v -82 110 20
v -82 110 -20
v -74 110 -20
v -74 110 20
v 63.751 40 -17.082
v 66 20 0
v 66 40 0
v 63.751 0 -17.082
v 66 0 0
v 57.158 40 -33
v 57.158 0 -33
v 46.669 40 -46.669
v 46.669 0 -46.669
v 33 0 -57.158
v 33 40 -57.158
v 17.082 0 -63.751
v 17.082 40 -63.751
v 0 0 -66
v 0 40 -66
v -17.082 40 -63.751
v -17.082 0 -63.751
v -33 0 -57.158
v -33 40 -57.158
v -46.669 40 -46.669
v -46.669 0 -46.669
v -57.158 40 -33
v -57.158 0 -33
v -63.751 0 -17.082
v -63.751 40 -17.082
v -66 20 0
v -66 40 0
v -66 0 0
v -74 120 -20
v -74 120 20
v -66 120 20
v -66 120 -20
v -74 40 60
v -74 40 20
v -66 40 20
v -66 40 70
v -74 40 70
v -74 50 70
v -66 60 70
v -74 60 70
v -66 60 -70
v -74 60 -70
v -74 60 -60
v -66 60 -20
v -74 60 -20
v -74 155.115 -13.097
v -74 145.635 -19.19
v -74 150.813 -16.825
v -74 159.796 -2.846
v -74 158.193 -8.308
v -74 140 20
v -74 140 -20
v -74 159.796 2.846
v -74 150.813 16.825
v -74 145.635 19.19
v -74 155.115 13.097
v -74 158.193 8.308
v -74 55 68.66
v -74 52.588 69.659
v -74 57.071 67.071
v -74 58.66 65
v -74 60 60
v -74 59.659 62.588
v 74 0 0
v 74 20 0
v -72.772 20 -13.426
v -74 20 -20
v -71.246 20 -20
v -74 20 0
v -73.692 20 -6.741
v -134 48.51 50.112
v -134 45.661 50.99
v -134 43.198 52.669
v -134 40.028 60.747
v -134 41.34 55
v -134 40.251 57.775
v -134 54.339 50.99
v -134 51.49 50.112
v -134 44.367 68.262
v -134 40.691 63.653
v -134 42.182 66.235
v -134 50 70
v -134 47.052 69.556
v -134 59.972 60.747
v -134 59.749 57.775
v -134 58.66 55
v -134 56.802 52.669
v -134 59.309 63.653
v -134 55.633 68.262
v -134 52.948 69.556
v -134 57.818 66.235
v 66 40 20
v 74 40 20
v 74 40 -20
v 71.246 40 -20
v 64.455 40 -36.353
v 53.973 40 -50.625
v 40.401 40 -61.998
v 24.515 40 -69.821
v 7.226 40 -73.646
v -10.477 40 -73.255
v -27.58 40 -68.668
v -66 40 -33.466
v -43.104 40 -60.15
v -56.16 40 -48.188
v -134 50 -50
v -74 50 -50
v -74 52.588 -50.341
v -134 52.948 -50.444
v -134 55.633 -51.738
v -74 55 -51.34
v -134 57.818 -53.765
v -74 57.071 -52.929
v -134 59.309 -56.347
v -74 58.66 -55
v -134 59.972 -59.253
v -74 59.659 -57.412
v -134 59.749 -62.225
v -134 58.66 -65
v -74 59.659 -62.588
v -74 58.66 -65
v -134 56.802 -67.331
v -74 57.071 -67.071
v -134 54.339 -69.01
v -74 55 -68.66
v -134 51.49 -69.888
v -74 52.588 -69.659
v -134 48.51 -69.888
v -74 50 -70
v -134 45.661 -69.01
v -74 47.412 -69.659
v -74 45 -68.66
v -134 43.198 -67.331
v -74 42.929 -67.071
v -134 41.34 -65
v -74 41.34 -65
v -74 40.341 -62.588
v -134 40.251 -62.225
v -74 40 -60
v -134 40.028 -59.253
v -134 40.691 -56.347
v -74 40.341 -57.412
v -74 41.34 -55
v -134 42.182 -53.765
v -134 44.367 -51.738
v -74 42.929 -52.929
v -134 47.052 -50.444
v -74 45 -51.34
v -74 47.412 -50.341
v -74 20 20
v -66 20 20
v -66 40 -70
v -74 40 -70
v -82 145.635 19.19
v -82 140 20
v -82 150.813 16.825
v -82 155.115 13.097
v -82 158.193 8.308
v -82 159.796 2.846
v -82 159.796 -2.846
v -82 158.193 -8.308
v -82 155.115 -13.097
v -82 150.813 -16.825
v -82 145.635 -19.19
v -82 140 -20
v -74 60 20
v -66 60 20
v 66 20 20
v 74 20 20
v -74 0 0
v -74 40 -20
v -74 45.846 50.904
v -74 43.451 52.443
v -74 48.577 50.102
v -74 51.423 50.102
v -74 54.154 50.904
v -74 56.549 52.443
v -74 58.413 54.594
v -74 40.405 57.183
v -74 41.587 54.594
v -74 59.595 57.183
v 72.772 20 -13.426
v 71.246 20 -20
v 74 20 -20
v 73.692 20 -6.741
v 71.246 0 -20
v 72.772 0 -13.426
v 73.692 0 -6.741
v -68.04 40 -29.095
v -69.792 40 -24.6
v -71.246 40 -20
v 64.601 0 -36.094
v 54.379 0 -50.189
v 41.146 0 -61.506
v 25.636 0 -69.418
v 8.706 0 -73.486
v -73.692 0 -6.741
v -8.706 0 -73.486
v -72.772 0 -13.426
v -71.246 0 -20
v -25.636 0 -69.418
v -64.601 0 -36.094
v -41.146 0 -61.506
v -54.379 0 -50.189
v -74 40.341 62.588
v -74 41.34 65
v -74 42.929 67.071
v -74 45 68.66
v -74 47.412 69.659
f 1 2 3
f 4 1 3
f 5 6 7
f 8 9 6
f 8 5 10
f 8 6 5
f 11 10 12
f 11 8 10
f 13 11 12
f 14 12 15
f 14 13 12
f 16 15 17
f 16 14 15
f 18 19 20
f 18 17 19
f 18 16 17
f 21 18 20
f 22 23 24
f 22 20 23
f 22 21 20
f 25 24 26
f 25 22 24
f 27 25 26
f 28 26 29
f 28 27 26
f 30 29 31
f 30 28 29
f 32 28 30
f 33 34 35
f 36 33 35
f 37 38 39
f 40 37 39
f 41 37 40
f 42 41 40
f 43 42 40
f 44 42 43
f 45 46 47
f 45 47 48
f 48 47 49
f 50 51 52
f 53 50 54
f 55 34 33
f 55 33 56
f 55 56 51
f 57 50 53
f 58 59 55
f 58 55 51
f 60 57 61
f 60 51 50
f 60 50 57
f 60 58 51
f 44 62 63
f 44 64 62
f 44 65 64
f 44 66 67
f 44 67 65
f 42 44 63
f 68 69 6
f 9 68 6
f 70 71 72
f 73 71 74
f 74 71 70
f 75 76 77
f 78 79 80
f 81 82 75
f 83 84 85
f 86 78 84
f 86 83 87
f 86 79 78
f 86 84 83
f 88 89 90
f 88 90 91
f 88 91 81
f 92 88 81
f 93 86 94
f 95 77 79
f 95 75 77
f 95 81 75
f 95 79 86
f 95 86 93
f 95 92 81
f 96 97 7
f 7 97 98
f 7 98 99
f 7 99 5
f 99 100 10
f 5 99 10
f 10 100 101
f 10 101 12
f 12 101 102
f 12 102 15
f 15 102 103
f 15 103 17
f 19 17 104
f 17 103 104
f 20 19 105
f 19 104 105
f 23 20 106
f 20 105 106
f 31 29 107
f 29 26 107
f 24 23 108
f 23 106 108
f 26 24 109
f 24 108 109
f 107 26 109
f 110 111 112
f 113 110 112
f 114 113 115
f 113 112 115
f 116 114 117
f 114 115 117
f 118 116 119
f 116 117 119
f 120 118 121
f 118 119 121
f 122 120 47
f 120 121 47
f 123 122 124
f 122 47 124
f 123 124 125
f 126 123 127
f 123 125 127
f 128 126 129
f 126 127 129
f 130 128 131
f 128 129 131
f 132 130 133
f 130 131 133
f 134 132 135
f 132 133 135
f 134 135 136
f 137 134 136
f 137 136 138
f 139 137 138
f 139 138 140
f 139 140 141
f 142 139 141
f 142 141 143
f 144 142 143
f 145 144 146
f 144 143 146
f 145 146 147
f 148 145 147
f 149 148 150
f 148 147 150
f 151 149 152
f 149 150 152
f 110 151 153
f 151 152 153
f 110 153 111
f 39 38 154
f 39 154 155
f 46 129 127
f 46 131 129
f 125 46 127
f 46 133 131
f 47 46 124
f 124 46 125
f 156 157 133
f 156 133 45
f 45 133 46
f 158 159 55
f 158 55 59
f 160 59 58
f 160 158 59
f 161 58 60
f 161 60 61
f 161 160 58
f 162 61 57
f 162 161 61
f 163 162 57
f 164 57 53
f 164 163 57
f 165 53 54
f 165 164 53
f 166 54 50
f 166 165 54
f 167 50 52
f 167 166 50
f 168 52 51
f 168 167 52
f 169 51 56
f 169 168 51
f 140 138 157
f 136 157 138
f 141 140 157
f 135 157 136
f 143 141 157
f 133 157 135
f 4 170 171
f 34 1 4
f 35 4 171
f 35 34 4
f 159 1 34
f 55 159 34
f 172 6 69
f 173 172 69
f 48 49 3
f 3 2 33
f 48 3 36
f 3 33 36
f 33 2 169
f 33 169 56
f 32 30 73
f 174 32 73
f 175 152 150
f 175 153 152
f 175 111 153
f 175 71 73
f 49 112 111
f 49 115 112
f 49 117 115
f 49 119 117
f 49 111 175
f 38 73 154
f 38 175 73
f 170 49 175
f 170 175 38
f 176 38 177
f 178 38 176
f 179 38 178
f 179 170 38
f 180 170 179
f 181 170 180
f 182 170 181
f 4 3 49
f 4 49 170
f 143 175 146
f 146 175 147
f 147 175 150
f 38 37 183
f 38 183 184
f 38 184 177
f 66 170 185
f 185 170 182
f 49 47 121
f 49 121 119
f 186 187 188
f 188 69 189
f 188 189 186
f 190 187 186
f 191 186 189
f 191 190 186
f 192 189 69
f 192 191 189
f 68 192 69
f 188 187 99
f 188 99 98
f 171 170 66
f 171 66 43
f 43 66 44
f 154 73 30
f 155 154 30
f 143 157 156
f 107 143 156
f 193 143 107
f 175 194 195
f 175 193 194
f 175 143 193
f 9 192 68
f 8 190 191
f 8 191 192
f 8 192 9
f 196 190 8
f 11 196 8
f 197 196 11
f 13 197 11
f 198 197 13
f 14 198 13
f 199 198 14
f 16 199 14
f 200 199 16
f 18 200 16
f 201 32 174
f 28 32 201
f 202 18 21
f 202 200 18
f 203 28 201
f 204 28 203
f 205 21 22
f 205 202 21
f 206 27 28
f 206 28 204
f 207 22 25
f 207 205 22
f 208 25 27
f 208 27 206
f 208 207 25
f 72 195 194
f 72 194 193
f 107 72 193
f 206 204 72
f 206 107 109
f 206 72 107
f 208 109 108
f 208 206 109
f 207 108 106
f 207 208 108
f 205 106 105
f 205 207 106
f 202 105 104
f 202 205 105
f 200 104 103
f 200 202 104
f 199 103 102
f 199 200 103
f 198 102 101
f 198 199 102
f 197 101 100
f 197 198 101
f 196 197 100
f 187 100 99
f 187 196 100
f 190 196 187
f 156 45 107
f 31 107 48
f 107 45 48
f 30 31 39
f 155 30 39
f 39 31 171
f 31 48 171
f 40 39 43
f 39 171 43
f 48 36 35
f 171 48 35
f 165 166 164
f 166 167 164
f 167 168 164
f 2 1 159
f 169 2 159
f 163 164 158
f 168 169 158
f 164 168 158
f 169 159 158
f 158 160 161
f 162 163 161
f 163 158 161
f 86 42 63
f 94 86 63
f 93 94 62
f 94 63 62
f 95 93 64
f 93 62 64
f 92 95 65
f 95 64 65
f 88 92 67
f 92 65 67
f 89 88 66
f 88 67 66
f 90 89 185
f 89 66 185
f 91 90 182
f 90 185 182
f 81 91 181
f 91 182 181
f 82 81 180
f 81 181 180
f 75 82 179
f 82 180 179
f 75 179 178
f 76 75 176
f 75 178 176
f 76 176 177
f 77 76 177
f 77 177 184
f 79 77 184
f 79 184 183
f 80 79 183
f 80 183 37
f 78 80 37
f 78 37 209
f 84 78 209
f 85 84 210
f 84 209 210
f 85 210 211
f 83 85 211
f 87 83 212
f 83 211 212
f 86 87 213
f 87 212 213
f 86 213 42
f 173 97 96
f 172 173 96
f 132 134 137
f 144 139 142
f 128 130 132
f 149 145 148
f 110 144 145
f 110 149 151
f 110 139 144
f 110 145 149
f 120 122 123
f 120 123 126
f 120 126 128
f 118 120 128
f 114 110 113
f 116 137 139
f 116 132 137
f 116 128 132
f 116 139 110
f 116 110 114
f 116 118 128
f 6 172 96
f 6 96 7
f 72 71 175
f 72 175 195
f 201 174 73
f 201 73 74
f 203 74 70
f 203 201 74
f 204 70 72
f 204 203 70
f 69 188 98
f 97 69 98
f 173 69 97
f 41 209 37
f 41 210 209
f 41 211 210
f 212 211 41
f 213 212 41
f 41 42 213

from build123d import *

# Parameters (mm, degrees)
EXTRUDE_1_DEPTH     = 40
SKETCH_2_W          = 8
SKETCH_2_H          = 40
EXTRUDE_2_DEPTH     = 80
SKETCH_5_W          = 87.00766185
SKETCH_5_H          = 115.01495327
CUT_EXTRUDE_2_DEPTH = 10
SKETCH_6_R          = 85.063361003
CUT_EXTRUDE_3_DEPTH = 20
SKETCH_7_W          = 140
SKETCH_7_H          = 20
EXTRUDE_3_DEPTH     = 8
SKETCH_9_R          = 10
EXTRUDE_4_DEPTH     = 60
SKETCH_10_W         = 8
SKETCH_10_H         = 50
EXTRUDE_5_DEPTH     = 40
CUT_EXTRUDE_4_DEPTH = 40


with BuildPart() as part:
    # 草图1 → 凸台-拉伸1 (new body)
    with BuildSketch(Plane(origin=(0, 0, 0), x_dir=(1, 0, 0), z_dir=(0, 1, 0))):
        with BuildLine():
            Line((-74, 20), (-71.246052522, 20))
            ThreePointArc((-71.246052522, 20), (0, 74), (71.246052522, 20))
            Line((71.246052522, 20), (74, 20))
            Line((74, 20), (74, -20))
            Line((74, -20), (66, -20))
            Line((66, -20), (66, 0))
            ThreePointArc((66, 0), (0, 66), (-66, 0))
            Line((-66, 0), (-66, -20))
            Line((-66, -20), (-74, -20))
            Line((-74, -20), (-74, 20))
        make_face()
    extrude(amount=EXTRUDE_1_DEPTH)

    # 草图2 → 凸台-拉伸2 (add)
    with BuildSketch(Plane(origin=(0, 40, 0), x_dir=(1, 0, 0), z_dir=(0, 1, 0))):
        with Locations((-70, 0)):
            Rectangle(SKETCH_2_W, SKETCH_2_H)
        with Locations((70, 0)):
            Rectangle(SKETCH_2_W, SKETCH_2_H)
    extrude(amount=EXTRUDE_2_DEPTH)

    # 草图5 → 切除-拉伸2 (cut)
    with BuildSketch(Plane(origin=(74, 0, 0), x_dir=(0, 0, -1), z_dir=(1, 0, 0))):
        with Locations((-23.503830925, 97.507476635)):
            Rectangle(SKETCH_5_W, SKETCH_5_H)
    extrude(amount=-CUT_EXTRUDE_2_DEPTH, mode=Mode.SUBTRACT)

    # 草图6 → 切除-拉伸3 (cut)
    with BuildSketch(Plane.XZ):
        Circle(SKETCH_6_R)
        with BuildLine():
            Line((-71.246052522, 20), (-66, 20))
            Line((-66, 20), (-66, 0))
            Line((-66, 0), (-74, 0))
            ThreePointArc((-74, 0), (0, -74), (74, 0))
            Line((74, 0), (66, 0))
            Line((66, 0), (66, 20))
            Line((66, 20), (71.246052522, 20))
            ThreePointArc((71.246052522, 20), (0, 74), (-71.246052522, 20))
        make_face(mode=Mode.SUBTRACT)
    extrude(amount=-CUT_EXTRUDE_3_DEPTH, mode=Mode.SUBTRACT)

    # 草图7 → 凸台-拉伸3 (add)
    with BuildSketch(Plane.ZY.offset(74)):
        with Locations((0, 50)):
            Rectangle(SKETCH_7_W, SKETCH_7_H)
    extrude(amount=-EXTRUDE_3_DEPTH)

    # 草图9 → 凸台-拉伸4 (add)
    with BuildSketch(Plane.ZY.offset(74)):
        with Locations((-60, 50)):
            Circle(SKETCH_9_R)
        with Locations((60, 50)):
            Circle(SKETCH_9_R)
    extrude(amount=EXTRUDE_4_DEPTH)

    # 草图10 → 凸台-拉伸5 (add)
    with BuildSketch(Plane.XY.offset(20)):
        with Locations((-78, 135)):
            Rectangle(SKETCH_10_W, SKETCH_10_H)
    extrude(amount=-EXTRUDE_5_DEPTH)

    # 草图11 → 切除-拉伸4 (cut)
    with BuildSketch(Plane.ZY.offset(82)):
        with BuildLine():
            Line((-20, 140), (-20, 168.258518719))
            Line((-20, 168.258518719), (20, 168.258518719))
            Line((20, 168.258518719), (20, 140))
            ThreePointArc((20, 140), (0, 160), (-20, 140))
        make_face()
    extrude(amount=-CUT_EXTRUDE_4_DEPTH, mode=Mode.SUBTRACT)


solid = part.part
